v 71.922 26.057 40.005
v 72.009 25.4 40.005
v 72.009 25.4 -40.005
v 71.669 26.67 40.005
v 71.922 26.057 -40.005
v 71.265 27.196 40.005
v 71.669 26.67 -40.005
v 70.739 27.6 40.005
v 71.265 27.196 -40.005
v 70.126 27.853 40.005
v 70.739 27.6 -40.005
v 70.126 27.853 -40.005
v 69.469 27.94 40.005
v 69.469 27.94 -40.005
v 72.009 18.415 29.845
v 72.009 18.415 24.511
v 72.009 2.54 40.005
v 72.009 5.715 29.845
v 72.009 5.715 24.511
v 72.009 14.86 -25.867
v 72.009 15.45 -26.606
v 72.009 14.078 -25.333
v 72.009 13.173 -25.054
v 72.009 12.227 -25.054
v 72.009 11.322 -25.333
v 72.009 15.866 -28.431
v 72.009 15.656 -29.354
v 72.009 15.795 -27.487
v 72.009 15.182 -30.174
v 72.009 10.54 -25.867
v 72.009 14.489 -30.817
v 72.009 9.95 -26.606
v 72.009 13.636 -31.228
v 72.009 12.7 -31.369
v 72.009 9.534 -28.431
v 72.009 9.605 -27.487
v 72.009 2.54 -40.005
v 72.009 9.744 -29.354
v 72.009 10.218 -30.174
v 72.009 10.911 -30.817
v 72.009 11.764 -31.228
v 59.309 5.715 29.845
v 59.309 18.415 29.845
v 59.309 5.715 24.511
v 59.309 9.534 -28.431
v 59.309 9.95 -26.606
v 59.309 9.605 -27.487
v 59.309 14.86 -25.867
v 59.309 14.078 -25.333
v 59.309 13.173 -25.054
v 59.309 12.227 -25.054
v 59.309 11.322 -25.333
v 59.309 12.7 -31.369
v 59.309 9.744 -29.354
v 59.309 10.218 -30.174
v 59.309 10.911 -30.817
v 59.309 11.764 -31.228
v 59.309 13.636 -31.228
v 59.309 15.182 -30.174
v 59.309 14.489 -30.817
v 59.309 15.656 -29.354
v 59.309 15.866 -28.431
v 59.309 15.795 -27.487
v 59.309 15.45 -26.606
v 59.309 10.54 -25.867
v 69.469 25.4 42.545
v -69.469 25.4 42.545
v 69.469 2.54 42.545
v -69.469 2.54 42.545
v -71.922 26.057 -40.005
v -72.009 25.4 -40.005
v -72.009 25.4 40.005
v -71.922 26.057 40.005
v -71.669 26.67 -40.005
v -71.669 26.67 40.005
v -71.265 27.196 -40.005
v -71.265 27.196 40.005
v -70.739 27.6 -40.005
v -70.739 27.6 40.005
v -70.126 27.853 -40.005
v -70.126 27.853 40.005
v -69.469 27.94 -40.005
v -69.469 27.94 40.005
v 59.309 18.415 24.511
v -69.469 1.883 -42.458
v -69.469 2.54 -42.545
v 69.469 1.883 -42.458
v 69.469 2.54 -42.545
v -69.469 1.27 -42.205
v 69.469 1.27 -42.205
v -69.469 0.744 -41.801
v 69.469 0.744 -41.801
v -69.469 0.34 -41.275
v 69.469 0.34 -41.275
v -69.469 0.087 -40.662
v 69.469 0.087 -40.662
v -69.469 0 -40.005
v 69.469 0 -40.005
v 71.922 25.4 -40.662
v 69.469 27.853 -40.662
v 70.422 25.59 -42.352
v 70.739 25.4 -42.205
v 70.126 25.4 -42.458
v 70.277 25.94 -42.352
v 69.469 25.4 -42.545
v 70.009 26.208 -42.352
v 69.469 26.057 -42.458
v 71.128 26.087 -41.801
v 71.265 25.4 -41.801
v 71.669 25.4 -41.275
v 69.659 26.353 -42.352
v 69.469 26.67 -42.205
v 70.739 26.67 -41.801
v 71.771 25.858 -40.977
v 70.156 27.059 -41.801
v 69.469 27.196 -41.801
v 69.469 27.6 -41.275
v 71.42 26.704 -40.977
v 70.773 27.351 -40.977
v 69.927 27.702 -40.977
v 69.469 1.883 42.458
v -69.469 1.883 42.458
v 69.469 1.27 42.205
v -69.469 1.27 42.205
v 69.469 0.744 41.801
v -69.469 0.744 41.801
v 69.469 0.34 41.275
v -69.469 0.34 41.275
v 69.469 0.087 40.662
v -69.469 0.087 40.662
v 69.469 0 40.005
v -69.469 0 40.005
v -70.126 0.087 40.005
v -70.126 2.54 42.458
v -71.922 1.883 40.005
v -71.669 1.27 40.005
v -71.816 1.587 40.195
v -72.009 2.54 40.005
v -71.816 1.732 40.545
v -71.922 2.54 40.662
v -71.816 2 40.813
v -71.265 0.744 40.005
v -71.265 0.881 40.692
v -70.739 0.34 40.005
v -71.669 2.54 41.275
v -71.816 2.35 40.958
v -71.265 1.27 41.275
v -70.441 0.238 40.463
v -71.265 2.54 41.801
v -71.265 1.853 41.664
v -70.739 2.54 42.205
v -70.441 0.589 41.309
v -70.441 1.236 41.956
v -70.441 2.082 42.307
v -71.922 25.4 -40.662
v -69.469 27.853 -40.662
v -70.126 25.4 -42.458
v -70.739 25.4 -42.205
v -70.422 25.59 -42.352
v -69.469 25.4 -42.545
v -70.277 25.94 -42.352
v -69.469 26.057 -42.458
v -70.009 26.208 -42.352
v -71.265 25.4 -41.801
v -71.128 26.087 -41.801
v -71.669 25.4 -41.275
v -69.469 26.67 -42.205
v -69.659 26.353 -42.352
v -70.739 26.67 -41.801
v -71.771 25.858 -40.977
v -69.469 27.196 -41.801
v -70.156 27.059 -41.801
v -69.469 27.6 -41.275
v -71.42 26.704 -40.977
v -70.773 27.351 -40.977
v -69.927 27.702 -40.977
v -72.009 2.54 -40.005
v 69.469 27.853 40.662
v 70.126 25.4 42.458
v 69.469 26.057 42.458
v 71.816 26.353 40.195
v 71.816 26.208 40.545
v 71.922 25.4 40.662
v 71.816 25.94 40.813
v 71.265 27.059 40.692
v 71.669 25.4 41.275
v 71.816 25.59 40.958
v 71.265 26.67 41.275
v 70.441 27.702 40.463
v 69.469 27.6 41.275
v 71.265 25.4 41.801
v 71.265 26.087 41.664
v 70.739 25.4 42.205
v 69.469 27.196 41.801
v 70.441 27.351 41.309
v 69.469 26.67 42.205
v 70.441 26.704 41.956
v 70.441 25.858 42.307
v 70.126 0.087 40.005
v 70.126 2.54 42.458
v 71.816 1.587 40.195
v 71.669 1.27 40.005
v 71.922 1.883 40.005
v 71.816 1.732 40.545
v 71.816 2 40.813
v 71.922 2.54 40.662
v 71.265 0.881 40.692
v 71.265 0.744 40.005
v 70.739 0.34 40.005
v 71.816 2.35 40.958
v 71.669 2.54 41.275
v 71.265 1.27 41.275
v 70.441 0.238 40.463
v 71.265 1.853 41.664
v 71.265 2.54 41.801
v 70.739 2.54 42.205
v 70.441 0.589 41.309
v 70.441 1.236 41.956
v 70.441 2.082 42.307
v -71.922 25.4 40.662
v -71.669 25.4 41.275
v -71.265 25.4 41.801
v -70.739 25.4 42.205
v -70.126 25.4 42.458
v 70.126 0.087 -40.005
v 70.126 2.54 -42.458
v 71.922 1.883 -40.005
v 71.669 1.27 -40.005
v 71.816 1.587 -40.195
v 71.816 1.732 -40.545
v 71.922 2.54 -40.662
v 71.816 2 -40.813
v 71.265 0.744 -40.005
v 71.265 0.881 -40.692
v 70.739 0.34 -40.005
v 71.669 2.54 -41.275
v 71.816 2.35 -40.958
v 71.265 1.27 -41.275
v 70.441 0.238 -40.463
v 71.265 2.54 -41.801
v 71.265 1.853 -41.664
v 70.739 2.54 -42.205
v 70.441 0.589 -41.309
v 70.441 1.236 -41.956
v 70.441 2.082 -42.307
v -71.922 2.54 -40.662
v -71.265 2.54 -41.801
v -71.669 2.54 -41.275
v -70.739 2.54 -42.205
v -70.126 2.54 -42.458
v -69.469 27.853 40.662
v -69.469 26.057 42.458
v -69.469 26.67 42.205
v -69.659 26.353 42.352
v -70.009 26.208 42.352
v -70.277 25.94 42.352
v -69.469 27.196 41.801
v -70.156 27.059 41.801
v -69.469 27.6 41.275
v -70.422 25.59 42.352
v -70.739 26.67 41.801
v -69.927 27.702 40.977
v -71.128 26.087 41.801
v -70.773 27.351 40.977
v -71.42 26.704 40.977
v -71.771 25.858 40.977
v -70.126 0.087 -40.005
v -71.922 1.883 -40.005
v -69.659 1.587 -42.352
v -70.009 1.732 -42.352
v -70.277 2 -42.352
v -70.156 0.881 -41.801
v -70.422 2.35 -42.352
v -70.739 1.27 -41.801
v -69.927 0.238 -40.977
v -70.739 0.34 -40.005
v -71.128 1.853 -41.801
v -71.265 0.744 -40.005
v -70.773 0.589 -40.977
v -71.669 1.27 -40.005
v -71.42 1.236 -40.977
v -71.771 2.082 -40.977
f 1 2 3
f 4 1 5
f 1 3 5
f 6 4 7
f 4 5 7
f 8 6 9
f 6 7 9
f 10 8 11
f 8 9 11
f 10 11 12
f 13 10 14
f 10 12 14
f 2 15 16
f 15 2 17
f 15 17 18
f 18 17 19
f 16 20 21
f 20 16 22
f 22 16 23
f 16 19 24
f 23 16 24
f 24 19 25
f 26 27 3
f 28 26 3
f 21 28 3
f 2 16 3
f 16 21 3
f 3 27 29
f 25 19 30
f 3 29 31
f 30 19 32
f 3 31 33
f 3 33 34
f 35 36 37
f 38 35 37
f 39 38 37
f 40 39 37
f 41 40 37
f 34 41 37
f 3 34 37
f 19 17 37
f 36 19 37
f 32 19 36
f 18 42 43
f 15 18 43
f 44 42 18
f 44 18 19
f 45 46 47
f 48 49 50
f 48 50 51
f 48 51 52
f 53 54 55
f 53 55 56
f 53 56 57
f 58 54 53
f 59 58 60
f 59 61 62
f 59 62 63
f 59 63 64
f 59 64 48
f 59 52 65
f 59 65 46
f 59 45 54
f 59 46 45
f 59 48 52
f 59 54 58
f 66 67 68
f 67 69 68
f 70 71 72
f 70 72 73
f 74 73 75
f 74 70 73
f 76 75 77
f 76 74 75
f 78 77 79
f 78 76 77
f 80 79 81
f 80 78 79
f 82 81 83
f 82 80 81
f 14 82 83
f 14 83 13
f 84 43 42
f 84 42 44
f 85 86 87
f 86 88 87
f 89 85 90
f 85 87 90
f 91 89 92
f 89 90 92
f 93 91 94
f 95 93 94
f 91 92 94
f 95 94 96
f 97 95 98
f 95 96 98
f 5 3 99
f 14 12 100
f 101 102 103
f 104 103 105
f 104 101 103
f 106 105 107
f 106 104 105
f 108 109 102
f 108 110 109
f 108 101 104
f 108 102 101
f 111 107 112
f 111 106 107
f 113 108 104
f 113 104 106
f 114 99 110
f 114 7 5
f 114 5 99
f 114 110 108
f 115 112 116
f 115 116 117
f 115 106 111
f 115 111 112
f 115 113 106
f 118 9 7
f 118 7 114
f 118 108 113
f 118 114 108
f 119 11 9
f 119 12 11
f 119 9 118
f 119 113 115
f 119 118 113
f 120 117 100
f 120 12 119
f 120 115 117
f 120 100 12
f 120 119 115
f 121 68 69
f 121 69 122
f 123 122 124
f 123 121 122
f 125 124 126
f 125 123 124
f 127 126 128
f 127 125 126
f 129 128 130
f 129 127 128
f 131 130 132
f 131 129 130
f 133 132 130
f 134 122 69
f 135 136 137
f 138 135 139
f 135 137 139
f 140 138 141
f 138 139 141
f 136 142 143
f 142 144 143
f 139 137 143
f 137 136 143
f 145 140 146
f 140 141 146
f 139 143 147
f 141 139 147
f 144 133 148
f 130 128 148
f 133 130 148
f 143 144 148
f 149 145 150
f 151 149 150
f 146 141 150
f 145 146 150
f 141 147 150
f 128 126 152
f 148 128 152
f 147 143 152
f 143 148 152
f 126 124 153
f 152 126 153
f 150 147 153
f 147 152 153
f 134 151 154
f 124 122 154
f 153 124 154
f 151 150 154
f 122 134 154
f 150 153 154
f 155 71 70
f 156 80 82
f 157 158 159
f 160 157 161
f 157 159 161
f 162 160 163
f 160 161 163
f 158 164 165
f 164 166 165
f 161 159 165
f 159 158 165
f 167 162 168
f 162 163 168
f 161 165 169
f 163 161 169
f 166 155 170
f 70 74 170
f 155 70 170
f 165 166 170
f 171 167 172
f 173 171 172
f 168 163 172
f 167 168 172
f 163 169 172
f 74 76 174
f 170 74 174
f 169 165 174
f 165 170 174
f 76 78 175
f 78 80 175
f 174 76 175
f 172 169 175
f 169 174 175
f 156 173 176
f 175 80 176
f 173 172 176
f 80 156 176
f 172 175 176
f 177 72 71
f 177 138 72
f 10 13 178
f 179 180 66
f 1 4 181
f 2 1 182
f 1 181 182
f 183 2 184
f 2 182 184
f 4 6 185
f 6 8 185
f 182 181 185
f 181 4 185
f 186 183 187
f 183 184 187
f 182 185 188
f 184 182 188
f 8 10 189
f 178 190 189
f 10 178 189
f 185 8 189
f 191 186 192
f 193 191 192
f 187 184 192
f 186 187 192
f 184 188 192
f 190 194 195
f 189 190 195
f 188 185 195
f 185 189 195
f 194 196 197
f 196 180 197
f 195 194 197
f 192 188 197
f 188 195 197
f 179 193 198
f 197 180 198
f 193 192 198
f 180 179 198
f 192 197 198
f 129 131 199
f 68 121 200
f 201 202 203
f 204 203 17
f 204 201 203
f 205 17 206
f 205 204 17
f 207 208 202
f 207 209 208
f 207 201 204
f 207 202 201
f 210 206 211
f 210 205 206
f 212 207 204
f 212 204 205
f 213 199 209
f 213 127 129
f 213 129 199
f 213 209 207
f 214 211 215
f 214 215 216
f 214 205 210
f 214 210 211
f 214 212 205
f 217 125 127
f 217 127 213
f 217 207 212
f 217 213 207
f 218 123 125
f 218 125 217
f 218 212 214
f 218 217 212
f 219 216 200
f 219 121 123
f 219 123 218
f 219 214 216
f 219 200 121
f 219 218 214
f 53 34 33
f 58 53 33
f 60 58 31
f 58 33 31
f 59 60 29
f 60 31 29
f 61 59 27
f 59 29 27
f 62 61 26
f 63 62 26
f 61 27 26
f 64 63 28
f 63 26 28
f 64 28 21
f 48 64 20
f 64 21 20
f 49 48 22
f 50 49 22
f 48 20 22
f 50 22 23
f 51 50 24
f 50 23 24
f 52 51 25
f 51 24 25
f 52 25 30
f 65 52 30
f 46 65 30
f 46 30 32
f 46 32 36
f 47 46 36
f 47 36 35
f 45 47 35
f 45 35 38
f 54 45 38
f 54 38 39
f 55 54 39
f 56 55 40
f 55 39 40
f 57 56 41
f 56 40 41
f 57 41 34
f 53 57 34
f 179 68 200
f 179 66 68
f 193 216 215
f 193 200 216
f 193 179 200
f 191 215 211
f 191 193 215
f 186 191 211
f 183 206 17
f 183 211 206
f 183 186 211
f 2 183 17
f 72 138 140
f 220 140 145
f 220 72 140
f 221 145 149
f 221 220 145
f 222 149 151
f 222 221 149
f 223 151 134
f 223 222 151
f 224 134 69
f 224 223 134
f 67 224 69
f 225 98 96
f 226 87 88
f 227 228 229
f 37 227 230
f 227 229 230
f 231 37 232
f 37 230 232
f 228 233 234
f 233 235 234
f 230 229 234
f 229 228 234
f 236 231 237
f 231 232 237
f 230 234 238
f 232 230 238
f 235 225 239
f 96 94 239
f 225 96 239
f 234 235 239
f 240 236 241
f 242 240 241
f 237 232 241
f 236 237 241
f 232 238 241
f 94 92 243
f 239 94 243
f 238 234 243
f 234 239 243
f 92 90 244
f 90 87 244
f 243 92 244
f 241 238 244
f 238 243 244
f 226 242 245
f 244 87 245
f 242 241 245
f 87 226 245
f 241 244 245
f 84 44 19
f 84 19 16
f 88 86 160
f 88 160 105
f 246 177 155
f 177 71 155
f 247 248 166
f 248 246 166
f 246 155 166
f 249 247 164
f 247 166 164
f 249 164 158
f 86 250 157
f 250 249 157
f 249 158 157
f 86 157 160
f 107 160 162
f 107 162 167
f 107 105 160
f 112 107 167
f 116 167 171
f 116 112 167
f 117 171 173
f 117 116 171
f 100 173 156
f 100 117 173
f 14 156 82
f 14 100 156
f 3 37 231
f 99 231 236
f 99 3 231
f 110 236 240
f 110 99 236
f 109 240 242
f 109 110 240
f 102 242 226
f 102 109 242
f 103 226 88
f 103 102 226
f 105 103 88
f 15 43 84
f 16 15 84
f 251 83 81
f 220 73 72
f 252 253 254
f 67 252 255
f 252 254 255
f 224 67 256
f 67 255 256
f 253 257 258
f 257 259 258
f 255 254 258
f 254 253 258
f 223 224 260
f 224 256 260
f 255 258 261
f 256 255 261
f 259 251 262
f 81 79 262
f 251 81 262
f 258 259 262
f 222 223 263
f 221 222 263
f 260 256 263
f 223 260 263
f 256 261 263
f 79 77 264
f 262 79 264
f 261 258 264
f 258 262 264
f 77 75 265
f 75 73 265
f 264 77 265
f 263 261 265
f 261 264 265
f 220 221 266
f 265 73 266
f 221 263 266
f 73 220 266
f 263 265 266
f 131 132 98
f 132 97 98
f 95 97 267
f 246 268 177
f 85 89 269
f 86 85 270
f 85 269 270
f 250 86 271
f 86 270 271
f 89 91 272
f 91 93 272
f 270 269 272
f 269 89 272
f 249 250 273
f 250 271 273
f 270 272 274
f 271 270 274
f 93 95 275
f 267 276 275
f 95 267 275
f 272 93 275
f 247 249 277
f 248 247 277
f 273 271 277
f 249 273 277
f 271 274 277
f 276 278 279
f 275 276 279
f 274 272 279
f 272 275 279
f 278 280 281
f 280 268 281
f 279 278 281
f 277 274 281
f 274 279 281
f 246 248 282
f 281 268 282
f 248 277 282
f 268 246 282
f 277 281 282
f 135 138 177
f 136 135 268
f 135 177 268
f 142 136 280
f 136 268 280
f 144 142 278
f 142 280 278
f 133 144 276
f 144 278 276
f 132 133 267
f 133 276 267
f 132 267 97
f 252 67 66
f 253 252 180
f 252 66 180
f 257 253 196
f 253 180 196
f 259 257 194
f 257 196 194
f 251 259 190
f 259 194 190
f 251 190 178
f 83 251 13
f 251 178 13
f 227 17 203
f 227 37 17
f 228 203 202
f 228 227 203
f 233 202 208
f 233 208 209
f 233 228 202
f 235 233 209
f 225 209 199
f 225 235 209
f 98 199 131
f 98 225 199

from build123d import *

# Parameters (mm, degrees)
SKETCH1_W           = 144.018
SKETCH1_H           = 85.09
BOSS_EXTRUDE1_DEPTH = 27.94
FILLET1_R           = 2.54
SKETCH3_R           = 3.175
SKETCH3_W           = 5.334
SKETCH3_H           = 12.7
CUT_EXTRUDE1_DEPTH  = 12.7


with BuildPart() as part:
    # Sketch1 → Boss-Extrude1 (new body)
    with BuildSketch(Plane(origin=(0, 0, 0), x_dir=(1, 0, 0), z_dir=(0, 1, 0))):
        Rectangle(SKETCH1_W, SKETCH1_H)
    extrude(amount=BOSS_EXTRUDE1_DEPTH)

    # Fillet1
    fillet1_edges = [part.edges().sort_by_distance(p)[0] for p in [
        (-72.009, 27.94, 0),
        (0, 27.94, 42.545),
        (72.009, 27.94, 0),
        (0, 0, 42.545),
        (-72.009, 0, 0),
        (0, 0, -42.545),
        (72.009, 0, 0),
        (72.009, 13.97, 42.545),
        (-72.009, 13.97, 42.545),
        (-72.009, 13.97, -42.545),
        (72.009, 13.97, -42.545),
        (0, 27.94, -42.545),
    ]]
    fillet(fillet1_edges, radius=FILLET1_R)

    # Sketch3 → Cut-Extrude1 (cut)
    with BuildSketch(Plane(origin=(72.009, 0, 0), x_dir=(0, 0, -1), z_dir=(1, 0, 0))):
        with Locations((28.194, 12.7)):
            Circle(SKETCH3_R)
        with Locations((-27.178, 12.065)):
            Rectangle(SKETCH3_W, SKETCH3_H)
    extrude(amount=-CUT_EXTRUDE1_DEPTH, mode=Mode.SUBTRACT)


solid = part.part
